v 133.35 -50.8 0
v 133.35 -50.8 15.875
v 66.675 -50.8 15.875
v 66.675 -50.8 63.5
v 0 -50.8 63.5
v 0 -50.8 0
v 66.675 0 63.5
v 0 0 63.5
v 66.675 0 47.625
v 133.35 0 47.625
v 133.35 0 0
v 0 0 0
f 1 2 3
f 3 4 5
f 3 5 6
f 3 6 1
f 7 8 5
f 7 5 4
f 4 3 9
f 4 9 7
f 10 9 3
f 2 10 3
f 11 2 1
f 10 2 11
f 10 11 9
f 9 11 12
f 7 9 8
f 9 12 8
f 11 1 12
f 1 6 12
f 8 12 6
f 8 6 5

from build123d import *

# Parameters (mm, degrees)
F0_W     = 66.675
F0_H     = 63.5
F1_DEPTH = 50.8
F3_DEPTH = 66.675


with BuildPart() as f1:
    # F0 (on Front) → F1 (new body)
    with BuildSketch(Plane.XZ):
        with Locations((33.3375, 31.75)):
            Rectangle(F0_W, F0_H)
    extrude(amount=F1_DEPTH)

    # F2 (on face) → F3 (join)
    with BuildSketch(Plane.YZ.offset(66.675)):
        Polygon((-50.8, 15.875), (-50.8, 0), (0, 0), (0, 47.625), align=None)
    extrude(amount=F3_DEPTH)


solid = f1.part
